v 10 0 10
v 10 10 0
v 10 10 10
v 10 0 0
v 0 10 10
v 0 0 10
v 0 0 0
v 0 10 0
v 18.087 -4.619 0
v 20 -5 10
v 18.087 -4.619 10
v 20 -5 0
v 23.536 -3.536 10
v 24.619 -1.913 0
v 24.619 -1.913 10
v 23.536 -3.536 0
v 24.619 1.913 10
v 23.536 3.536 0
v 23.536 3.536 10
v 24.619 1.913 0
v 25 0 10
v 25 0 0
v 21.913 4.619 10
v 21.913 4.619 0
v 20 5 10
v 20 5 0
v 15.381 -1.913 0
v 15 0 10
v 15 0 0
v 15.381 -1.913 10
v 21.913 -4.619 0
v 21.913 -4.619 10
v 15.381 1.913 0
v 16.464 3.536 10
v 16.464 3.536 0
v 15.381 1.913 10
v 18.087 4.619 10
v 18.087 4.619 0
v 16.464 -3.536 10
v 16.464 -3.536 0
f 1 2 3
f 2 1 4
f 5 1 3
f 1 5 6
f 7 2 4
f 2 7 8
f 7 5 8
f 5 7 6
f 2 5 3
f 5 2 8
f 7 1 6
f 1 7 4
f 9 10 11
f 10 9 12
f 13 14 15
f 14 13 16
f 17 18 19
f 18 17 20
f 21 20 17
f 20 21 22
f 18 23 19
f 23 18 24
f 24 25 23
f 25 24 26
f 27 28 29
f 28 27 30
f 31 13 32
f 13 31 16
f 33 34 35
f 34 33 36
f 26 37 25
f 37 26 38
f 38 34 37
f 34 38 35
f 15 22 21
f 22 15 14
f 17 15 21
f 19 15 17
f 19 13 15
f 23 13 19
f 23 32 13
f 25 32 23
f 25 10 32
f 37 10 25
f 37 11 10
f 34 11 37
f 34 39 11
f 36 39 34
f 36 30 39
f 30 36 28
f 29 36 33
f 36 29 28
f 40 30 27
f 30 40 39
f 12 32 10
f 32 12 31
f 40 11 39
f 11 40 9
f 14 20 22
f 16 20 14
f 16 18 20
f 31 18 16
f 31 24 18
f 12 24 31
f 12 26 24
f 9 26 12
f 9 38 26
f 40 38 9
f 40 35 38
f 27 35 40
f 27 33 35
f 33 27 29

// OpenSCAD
cube(10);
translate([20, 0, 0]) {
	cylinder(r=5, h=10);
}
